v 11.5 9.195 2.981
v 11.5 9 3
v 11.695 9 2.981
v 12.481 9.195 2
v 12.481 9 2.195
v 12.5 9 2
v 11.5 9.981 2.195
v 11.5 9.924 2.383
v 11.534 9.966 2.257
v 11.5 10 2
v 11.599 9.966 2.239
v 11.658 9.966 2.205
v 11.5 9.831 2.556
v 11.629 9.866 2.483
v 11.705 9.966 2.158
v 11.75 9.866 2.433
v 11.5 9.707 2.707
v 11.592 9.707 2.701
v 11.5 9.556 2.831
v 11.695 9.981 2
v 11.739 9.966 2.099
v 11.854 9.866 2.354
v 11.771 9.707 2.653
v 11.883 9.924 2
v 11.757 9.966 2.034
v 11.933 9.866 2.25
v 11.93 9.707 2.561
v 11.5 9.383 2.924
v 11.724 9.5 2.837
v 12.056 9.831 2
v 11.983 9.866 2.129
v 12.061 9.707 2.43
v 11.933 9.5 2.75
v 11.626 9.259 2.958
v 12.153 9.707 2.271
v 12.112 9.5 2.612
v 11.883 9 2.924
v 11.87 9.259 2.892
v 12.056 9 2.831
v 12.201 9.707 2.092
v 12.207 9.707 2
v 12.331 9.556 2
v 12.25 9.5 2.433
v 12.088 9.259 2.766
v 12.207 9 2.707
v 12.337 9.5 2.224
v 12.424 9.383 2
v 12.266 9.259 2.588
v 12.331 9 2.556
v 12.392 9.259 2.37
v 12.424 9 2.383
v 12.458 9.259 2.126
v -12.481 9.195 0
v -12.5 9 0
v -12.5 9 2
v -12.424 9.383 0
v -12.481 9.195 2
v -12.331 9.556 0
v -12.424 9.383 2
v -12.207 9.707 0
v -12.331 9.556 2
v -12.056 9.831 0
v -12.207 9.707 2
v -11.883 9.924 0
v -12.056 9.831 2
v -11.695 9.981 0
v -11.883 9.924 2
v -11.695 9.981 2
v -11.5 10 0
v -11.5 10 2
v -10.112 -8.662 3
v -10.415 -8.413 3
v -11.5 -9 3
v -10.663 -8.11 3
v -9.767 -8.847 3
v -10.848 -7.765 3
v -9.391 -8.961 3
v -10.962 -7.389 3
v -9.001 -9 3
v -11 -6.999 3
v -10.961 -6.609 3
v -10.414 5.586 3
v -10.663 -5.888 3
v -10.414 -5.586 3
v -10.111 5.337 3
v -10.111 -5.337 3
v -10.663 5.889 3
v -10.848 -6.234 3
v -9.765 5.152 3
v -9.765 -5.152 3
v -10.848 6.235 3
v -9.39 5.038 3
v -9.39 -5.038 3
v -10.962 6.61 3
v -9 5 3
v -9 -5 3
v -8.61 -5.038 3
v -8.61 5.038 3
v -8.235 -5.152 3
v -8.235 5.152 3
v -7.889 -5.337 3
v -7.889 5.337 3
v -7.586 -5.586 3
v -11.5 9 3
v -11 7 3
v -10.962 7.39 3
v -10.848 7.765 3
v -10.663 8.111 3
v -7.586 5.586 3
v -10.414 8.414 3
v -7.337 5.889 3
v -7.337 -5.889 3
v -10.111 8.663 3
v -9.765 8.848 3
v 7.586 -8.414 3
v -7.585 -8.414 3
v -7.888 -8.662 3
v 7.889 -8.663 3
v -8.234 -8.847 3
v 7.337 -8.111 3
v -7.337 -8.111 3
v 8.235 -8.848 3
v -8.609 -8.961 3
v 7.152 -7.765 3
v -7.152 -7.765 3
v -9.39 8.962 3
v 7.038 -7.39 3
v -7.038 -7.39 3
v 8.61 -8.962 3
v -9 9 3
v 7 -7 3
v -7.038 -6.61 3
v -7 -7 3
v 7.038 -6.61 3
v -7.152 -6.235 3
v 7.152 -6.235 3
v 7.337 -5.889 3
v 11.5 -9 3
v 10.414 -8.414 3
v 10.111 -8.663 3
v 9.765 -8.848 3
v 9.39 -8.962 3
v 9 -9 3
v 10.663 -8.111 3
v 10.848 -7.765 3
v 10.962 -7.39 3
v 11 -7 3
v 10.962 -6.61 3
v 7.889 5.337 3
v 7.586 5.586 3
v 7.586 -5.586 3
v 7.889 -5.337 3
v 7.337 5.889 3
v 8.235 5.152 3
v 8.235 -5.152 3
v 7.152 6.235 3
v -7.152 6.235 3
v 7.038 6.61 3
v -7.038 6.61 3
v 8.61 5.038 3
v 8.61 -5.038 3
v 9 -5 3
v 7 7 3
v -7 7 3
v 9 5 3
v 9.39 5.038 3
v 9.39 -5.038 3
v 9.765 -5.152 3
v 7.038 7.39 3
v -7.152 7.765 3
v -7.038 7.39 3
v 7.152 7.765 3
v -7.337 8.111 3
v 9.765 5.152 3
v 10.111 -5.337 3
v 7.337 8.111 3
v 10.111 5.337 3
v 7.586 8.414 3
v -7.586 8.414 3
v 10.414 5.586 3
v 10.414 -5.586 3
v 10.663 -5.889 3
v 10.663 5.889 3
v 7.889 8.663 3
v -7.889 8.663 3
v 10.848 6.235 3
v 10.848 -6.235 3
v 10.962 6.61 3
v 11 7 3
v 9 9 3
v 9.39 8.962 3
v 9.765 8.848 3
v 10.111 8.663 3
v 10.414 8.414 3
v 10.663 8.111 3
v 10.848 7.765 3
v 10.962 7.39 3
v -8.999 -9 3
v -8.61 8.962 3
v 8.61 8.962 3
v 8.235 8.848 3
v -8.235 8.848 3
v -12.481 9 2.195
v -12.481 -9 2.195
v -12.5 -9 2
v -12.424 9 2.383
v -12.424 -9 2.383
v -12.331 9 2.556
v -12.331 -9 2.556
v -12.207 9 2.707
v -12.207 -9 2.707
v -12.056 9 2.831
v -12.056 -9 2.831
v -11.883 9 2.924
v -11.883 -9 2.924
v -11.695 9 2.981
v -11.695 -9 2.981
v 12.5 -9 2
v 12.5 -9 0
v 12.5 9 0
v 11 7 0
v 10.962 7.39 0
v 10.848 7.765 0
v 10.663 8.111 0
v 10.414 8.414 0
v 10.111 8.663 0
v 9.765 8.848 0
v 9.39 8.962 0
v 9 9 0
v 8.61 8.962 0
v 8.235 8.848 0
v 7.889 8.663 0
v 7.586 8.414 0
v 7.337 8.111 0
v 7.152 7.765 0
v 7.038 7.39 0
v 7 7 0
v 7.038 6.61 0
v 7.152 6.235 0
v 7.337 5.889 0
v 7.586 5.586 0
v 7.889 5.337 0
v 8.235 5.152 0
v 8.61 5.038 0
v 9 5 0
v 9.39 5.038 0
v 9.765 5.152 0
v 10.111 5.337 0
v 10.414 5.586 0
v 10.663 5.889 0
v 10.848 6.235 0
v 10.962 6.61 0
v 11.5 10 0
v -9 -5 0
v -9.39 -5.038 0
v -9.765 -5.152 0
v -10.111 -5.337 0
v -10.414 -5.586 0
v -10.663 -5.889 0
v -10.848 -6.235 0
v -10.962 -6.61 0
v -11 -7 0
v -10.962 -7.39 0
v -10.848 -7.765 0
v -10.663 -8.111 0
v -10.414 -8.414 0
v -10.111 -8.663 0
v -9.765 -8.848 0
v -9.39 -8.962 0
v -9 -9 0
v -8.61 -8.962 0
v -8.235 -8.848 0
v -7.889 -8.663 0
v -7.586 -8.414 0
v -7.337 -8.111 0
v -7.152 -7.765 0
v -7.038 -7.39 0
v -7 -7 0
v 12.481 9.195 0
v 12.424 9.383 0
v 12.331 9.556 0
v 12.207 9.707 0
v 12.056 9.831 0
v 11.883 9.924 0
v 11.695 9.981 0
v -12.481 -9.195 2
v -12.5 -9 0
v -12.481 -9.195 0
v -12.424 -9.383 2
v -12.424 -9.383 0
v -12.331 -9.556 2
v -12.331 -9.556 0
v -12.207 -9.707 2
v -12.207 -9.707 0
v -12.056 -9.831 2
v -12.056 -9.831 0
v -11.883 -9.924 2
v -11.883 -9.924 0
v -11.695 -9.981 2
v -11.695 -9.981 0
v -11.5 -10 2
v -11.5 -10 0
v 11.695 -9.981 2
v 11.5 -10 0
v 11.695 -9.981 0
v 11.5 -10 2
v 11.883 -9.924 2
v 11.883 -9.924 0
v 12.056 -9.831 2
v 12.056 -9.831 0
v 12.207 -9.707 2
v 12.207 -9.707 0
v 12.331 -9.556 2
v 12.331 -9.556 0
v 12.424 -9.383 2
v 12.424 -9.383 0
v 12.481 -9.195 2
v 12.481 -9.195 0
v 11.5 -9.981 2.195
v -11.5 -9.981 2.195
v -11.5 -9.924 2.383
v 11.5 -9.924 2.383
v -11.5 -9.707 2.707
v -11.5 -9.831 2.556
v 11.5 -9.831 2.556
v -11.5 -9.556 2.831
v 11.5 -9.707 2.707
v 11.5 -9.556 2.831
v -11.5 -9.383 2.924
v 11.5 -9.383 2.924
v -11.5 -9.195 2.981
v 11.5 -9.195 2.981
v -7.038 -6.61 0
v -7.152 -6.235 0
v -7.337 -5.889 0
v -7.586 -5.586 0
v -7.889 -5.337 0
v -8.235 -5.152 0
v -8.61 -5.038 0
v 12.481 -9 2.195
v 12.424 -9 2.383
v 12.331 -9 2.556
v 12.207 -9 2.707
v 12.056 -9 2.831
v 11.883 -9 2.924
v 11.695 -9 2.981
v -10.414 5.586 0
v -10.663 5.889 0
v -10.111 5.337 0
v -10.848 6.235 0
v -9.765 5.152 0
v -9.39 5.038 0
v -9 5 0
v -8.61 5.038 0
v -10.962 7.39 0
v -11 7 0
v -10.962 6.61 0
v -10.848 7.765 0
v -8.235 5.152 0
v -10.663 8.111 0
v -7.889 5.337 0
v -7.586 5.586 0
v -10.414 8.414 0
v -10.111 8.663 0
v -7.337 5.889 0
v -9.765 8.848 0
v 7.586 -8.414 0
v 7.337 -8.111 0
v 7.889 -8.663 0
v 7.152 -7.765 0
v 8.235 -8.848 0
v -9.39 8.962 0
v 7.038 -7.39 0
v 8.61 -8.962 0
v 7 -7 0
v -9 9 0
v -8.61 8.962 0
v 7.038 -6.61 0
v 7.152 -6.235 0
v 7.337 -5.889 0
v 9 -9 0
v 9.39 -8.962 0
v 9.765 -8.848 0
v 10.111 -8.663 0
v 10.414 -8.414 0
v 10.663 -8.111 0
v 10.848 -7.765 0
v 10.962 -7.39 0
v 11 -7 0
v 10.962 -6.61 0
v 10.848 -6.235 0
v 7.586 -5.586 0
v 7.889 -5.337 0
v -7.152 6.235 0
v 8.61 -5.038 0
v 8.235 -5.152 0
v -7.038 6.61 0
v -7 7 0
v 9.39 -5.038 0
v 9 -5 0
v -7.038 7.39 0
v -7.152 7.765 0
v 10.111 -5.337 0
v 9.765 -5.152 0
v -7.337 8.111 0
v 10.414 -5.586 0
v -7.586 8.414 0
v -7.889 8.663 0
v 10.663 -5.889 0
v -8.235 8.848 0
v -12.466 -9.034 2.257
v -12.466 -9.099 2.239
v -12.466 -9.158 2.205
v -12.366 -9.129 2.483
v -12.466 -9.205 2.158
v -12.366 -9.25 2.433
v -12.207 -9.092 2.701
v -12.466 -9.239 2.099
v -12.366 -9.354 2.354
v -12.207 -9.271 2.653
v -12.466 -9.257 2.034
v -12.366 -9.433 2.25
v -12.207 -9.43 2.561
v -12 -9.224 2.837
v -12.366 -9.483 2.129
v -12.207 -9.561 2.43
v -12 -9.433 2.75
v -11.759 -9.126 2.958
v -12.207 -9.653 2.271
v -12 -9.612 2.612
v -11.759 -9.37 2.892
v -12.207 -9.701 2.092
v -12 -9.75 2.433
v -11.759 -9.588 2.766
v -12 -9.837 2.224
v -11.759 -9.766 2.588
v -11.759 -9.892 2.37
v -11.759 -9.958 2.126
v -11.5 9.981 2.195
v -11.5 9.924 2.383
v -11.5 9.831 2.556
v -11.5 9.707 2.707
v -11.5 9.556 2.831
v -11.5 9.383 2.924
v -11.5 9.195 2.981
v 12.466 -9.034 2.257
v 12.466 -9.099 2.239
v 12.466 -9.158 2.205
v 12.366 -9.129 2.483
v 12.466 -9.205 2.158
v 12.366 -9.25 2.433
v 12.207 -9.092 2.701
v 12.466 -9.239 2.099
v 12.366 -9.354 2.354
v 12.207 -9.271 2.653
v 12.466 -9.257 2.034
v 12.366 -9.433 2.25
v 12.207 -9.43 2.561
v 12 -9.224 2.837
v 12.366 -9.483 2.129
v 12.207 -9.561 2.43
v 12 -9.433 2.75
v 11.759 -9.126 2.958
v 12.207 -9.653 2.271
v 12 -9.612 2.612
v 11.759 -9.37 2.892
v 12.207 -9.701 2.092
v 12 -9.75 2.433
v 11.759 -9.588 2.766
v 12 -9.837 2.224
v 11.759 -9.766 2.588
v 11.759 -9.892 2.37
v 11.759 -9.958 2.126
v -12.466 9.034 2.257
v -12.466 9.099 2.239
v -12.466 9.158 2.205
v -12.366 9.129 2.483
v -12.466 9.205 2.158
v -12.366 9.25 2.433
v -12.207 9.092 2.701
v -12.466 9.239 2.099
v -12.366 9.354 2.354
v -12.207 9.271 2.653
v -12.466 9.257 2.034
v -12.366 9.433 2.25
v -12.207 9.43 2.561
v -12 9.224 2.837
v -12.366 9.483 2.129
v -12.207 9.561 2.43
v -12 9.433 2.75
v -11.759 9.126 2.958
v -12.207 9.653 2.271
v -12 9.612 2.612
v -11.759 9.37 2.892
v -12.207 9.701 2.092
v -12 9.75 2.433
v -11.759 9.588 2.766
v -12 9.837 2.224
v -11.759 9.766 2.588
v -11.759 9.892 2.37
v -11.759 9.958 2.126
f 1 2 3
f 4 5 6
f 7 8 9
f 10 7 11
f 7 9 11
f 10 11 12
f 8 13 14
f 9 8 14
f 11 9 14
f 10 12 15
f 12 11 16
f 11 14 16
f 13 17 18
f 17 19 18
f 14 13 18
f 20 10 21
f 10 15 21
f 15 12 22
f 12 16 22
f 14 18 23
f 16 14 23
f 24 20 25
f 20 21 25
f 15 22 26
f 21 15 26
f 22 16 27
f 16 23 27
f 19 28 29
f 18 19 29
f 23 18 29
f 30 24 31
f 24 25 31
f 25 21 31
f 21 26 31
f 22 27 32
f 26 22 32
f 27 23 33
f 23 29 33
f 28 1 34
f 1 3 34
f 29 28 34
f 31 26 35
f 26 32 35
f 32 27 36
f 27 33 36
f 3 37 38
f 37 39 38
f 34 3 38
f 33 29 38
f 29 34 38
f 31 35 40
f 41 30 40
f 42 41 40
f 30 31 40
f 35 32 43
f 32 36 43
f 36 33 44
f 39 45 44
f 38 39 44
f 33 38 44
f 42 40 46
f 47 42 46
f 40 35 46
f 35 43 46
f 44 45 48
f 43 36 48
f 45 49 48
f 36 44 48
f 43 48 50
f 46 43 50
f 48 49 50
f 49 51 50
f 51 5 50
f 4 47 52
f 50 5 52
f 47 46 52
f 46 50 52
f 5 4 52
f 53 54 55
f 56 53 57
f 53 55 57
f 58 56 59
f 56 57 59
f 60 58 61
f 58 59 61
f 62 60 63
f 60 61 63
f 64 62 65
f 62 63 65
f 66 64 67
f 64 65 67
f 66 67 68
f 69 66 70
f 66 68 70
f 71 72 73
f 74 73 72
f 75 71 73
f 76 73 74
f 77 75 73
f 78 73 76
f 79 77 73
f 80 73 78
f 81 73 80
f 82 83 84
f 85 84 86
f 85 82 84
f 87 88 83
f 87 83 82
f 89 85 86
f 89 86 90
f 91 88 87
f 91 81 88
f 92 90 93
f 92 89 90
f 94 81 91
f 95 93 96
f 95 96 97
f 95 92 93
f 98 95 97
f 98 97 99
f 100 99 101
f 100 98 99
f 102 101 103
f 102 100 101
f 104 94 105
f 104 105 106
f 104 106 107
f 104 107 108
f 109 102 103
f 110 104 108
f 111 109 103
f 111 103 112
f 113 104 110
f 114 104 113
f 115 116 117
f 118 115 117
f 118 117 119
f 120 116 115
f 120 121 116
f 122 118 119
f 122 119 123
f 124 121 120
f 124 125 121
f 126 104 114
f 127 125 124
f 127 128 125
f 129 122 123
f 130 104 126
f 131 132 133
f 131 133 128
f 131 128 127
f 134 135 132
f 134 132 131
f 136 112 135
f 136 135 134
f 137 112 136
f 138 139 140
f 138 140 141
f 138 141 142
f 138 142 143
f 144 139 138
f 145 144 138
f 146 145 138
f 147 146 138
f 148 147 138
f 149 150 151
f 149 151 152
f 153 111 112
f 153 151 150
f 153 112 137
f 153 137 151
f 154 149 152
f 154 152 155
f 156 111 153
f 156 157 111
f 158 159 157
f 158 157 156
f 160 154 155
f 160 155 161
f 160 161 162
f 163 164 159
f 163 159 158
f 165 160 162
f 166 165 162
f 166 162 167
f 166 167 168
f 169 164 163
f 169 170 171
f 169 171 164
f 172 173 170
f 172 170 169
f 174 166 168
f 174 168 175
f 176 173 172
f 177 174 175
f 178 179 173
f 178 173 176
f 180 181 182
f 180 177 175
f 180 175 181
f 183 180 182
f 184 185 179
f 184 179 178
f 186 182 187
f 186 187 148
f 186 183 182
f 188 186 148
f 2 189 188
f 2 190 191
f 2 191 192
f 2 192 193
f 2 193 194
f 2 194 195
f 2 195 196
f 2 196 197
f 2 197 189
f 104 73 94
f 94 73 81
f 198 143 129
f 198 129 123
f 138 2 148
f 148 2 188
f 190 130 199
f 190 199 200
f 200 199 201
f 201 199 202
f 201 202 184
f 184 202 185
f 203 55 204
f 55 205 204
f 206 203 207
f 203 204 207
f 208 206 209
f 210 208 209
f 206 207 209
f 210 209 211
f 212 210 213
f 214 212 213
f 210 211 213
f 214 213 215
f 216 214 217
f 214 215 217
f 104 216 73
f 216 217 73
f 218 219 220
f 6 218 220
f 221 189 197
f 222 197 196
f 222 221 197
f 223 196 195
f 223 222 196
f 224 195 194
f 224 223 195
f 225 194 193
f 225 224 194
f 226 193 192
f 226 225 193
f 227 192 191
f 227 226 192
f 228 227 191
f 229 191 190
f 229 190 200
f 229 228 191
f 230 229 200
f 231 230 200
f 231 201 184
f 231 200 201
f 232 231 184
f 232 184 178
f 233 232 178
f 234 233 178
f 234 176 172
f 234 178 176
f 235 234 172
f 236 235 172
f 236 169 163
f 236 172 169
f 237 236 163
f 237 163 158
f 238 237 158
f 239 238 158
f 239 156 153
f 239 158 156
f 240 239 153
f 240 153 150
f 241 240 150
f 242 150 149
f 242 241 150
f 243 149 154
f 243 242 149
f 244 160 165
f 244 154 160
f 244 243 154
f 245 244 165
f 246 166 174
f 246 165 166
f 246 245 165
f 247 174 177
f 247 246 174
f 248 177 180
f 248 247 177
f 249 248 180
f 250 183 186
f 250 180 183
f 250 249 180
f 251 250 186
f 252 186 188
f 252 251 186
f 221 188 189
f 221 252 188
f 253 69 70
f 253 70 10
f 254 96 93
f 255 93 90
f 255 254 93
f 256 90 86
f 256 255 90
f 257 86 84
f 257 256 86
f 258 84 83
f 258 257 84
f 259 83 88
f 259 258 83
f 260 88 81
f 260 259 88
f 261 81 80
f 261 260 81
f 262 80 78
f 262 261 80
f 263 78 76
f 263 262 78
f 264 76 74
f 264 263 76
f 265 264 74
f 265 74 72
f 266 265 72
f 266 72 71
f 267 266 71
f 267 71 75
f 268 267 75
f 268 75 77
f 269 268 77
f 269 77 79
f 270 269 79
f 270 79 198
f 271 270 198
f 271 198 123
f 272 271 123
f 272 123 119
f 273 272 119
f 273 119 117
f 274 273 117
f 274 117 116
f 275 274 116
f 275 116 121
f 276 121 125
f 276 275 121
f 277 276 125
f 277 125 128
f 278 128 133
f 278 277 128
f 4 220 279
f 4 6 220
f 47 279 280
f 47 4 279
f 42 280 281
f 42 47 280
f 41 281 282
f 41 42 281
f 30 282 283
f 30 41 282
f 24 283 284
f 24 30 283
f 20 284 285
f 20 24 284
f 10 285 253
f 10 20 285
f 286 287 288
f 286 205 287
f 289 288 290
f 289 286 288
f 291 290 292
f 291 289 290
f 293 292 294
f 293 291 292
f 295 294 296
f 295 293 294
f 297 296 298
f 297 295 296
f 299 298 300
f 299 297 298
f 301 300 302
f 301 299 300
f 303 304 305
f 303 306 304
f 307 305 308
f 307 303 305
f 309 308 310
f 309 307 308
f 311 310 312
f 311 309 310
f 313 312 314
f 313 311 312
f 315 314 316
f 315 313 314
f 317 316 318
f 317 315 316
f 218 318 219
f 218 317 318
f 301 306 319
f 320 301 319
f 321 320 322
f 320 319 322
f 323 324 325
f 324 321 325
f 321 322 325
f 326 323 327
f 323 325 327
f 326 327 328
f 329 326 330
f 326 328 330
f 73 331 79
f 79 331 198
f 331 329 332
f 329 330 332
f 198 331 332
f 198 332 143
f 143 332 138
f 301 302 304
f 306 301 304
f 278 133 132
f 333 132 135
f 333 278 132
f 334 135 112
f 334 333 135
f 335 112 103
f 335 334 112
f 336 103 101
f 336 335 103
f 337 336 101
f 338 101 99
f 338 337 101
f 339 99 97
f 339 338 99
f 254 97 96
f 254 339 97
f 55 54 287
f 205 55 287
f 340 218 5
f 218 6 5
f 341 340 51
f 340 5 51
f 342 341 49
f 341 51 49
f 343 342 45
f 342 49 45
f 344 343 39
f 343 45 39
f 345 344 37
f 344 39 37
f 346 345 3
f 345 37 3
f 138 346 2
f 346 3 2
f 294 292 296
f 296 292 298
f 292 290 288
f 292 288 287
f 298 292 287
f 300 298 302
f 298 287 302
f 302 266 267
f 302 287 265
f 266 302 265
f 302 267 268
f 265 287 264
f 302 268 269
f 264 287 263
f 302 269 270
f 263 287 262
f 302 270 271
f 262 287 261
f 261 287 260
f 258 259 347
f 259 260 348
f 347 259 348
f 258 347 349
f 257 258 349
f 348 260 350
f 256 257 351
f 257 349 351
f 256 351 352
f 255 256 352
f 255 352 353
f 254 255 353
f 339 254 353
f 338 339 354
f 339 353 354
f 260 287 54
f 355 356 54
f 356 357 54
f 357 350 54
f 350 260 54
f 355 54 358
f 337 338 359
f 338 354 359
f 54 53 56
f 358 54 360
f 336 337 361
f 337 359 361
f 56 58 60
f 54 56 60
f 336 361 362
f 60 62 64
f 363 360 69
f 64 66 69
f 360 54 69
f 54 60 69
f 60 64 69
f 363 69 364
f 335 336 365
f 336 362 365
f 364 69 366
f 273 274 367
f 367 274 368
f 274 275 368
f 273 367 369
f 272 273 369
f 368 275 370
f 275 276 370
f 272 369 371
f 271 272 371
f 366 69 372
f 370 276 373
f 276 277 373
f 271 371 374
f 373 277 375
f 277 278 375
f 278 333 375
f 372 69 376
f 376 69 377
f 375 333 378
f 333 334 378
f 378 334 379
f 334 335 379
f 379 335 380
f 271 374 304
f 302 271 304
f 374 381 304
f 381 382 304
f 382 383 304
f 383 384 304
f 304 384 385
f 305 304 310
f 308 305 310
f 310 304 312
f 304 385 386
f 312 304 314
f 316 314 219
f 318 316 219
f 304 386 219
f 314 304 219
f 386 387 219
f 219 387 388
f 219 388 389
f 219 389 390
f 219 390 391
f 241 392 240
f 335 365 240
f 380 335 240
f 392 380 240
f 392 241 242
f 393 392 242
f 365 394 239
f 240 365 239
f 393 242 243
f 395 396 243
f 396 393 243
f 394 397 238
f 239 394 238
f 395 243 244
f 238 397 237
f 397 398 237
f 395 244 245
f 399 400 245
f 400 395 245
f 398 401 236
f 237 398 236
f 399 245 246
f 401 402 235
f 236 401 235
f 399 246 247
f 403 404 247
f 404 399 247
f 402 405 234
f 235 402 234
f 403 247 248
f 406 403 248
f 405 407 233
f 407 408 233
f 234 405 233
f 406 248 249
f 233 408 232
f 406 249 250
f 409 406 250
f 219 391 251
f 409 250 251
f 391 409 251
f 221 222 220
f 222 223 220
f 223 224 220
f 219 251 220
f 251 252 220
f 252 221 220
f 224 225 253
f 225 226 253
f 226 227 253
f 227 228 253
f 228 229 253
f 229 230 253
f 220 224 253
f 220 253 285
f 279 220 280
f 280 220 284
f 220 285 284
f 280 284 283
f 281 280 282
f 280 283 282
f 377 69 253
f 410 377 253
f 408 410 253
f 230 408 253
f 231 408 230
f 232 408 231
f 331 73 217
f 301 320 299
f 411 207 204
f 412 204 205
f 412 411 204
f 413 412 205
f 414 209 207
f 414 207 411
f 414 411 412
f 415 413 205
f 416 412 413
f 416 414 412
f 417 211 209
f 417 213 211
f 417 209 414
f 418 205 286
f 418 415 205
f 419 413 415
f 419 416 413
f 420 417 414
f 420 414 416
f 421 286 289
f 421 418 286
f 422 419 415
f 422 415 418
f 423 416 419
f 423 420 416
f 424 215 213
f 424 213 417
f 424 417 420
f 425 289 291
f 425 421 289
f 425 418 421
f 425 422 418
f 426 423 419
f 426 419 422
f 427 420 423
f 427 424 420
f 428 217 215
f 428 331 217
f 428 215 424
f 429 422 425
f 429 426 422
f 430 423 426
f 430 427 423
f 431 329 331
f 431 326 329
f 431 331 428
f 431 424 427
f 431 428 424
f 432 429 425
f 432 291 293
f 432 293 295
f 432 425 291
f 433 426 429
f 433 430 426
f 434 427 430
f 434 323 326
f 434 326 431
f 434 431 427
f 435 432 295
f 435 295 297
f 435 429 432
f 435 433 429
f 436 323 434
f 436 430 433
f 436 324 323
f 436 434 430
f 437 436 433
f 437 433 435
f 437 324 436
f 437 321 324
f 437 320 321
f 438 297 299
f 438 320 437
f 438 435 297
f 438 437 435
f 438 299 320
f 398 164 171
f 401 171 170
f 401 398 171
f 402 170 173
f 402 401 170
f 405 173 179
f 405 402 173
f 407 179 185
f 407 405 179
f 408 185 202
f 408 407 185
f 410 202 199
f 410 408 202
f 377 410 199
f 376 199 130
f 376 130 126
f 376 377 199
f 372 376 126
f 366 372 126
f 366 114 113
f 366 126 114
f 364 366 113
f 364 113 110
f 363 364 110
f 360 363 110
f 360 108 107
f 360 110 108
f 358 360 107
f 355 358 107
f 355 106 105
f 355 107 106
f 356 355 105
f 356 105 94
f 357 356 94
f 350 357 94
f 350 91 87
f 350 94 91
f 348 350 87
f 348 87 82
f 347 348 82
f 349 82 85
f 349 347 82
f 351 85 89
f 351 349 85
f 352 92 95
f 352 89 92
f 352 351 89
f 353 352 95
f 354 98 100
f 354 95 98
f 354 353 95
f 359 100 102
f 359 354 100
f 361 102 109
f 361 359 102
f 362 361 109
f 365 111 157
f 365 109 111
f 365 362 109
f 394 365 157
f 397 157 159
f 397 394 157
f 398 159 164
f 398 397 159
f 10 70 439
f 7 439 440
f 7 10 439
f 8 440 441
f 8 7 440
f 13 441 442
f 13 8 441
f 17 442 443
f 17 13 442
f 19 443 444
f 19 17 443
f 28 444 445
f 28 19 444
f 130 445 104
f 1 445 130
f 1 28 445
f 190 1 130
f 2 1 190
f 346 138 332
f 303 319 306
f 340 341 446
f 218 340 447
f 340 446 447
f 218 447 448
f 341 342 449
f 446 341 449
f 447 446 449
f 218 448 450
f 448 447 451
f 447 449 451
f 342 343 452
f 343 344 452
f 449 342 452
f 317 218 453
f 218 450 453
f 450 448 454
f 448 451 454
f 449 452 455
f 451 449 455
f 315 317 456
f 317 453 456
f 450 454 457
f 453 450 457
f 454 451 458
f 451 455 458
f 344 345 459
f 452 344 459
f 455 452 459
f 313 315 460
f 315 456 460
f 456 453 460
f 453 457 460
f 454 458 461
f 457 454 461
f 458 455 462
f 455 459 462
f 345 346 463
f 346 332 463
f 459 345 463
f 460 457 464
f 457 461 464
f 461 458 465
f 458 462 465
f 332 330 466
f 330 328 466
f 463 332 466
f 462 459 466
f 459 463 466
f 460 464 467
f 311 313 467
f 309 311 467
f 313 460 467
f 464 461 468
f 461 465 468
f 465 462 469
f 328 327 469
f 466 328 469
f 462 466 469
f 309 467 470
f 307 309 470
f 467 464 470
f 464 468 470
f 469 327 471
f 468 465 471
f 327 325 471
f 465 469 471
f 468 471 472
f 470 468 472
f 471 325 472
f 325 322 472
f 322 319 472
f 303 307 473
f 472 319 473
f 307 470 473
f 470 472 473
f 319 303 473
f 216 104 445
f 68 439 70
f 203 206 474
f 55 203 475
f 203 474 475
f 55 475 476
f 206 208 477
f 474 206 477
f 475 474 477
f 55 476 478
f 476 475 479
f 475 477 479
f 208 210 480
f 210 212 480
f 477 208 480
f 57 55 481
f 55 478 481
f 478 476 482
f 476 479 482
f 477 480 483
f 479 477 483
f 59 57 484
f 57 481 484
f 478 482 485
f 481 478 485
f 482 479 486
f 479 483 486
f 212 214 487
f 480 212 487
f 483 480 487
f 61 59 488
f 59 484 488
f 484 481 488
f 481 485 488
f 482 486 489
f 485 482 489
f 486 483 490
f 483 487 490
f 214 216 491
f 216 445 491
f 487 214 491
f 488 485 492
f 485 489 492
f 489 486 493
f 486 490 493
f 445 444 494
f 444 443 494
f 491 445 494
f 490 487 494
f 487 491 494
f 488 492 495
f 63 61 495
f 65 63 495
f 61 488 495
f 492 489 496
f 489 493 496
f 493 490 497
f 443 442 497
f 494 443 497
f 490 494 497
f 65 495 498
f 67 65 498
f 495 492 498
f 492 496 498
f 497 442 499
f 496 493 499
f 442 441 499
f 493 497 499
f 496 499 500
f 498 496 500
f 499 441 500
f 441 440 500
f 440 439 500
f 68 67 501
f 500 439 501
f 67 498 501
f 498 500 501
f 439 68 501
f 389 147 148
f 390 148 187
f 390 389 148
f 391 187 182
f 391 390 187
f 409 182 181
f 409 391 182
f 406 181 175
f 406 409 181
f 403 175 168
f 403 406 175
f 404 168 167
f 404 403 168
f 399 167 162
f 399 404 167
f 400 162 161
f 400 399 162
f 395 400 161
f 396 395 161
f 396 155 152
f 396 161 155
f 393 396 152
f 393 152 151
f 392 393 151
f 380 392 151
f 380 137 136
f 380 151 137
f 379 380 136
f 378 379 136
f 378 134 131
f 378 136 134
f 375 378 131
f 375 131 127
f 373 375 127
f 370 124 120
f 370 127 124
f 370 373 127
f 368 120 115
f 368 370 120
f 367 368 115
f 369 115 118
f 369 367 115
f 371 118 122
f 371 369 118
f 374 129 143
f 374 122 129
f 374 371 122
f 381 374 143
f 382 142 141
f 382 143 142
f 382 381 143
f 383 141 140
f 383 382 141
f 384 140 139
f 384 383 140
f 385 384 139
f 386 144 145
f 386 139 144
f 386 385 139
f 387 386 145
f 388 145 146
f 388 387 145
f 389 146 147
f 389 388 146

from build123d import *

# Parameters (mm, degrees)
F0_W     = 25
F0_H     = 4.875
F0_H_2   = 10.25
F1_DEPTH = 3
F2_R     = 1
F3_R     = 2
F4_DEPTH = 68


with BuildPart() as f1:
    # F0 (on Top) → F1 (new body)
    with BuildSketch(Plane.XY):
        with Locations((0, 7.5625)):
            Rectangle(F0_W, F0_H)
        with Locations((0, -7.5625)):
            Rectangle(F0_W, F0_H)
        Rectangle(F0_W, F0_H_2)
    extrude(amount=F1_DEPTH)

    # F2
    f2_edges = [f1.edges().sort_by_distance(p)[0] for p in [
        (0, -10, 3),
        (12.5, 0, 3),
        (0, 10, 3),
        (-12.5, 0, 3),
        (12.5, -10, 1.5),
        (-12.5, -10, 1.5),
        (-12.5, 10, 1.5),
        (12.5, 10, 1.5),
    ]]
    fillet(f2_edges, radius=F2_R)

    # F3 (on face) → F4 (cut)
    with BuildSketch(Plane.XY):
        with BuildLine():
            ThreePointArc((-9, -5), (-10.414214, -8.414214), (-7, -7))
            ThreePointArc((-7, -7), (-7.585786, -5.585786), (-9, -5))
        make_face()
        with Locations((9, -7)):
            Circle(F3_R)
        with Locations((9, 7)):
            Circle(F3_R)
        with Locations((-9, 7)):
            Circle(F3_R)
    extrude(amount=F4_DEPTH, mode=Mode.SUBTRACT)


solid = f1.part
